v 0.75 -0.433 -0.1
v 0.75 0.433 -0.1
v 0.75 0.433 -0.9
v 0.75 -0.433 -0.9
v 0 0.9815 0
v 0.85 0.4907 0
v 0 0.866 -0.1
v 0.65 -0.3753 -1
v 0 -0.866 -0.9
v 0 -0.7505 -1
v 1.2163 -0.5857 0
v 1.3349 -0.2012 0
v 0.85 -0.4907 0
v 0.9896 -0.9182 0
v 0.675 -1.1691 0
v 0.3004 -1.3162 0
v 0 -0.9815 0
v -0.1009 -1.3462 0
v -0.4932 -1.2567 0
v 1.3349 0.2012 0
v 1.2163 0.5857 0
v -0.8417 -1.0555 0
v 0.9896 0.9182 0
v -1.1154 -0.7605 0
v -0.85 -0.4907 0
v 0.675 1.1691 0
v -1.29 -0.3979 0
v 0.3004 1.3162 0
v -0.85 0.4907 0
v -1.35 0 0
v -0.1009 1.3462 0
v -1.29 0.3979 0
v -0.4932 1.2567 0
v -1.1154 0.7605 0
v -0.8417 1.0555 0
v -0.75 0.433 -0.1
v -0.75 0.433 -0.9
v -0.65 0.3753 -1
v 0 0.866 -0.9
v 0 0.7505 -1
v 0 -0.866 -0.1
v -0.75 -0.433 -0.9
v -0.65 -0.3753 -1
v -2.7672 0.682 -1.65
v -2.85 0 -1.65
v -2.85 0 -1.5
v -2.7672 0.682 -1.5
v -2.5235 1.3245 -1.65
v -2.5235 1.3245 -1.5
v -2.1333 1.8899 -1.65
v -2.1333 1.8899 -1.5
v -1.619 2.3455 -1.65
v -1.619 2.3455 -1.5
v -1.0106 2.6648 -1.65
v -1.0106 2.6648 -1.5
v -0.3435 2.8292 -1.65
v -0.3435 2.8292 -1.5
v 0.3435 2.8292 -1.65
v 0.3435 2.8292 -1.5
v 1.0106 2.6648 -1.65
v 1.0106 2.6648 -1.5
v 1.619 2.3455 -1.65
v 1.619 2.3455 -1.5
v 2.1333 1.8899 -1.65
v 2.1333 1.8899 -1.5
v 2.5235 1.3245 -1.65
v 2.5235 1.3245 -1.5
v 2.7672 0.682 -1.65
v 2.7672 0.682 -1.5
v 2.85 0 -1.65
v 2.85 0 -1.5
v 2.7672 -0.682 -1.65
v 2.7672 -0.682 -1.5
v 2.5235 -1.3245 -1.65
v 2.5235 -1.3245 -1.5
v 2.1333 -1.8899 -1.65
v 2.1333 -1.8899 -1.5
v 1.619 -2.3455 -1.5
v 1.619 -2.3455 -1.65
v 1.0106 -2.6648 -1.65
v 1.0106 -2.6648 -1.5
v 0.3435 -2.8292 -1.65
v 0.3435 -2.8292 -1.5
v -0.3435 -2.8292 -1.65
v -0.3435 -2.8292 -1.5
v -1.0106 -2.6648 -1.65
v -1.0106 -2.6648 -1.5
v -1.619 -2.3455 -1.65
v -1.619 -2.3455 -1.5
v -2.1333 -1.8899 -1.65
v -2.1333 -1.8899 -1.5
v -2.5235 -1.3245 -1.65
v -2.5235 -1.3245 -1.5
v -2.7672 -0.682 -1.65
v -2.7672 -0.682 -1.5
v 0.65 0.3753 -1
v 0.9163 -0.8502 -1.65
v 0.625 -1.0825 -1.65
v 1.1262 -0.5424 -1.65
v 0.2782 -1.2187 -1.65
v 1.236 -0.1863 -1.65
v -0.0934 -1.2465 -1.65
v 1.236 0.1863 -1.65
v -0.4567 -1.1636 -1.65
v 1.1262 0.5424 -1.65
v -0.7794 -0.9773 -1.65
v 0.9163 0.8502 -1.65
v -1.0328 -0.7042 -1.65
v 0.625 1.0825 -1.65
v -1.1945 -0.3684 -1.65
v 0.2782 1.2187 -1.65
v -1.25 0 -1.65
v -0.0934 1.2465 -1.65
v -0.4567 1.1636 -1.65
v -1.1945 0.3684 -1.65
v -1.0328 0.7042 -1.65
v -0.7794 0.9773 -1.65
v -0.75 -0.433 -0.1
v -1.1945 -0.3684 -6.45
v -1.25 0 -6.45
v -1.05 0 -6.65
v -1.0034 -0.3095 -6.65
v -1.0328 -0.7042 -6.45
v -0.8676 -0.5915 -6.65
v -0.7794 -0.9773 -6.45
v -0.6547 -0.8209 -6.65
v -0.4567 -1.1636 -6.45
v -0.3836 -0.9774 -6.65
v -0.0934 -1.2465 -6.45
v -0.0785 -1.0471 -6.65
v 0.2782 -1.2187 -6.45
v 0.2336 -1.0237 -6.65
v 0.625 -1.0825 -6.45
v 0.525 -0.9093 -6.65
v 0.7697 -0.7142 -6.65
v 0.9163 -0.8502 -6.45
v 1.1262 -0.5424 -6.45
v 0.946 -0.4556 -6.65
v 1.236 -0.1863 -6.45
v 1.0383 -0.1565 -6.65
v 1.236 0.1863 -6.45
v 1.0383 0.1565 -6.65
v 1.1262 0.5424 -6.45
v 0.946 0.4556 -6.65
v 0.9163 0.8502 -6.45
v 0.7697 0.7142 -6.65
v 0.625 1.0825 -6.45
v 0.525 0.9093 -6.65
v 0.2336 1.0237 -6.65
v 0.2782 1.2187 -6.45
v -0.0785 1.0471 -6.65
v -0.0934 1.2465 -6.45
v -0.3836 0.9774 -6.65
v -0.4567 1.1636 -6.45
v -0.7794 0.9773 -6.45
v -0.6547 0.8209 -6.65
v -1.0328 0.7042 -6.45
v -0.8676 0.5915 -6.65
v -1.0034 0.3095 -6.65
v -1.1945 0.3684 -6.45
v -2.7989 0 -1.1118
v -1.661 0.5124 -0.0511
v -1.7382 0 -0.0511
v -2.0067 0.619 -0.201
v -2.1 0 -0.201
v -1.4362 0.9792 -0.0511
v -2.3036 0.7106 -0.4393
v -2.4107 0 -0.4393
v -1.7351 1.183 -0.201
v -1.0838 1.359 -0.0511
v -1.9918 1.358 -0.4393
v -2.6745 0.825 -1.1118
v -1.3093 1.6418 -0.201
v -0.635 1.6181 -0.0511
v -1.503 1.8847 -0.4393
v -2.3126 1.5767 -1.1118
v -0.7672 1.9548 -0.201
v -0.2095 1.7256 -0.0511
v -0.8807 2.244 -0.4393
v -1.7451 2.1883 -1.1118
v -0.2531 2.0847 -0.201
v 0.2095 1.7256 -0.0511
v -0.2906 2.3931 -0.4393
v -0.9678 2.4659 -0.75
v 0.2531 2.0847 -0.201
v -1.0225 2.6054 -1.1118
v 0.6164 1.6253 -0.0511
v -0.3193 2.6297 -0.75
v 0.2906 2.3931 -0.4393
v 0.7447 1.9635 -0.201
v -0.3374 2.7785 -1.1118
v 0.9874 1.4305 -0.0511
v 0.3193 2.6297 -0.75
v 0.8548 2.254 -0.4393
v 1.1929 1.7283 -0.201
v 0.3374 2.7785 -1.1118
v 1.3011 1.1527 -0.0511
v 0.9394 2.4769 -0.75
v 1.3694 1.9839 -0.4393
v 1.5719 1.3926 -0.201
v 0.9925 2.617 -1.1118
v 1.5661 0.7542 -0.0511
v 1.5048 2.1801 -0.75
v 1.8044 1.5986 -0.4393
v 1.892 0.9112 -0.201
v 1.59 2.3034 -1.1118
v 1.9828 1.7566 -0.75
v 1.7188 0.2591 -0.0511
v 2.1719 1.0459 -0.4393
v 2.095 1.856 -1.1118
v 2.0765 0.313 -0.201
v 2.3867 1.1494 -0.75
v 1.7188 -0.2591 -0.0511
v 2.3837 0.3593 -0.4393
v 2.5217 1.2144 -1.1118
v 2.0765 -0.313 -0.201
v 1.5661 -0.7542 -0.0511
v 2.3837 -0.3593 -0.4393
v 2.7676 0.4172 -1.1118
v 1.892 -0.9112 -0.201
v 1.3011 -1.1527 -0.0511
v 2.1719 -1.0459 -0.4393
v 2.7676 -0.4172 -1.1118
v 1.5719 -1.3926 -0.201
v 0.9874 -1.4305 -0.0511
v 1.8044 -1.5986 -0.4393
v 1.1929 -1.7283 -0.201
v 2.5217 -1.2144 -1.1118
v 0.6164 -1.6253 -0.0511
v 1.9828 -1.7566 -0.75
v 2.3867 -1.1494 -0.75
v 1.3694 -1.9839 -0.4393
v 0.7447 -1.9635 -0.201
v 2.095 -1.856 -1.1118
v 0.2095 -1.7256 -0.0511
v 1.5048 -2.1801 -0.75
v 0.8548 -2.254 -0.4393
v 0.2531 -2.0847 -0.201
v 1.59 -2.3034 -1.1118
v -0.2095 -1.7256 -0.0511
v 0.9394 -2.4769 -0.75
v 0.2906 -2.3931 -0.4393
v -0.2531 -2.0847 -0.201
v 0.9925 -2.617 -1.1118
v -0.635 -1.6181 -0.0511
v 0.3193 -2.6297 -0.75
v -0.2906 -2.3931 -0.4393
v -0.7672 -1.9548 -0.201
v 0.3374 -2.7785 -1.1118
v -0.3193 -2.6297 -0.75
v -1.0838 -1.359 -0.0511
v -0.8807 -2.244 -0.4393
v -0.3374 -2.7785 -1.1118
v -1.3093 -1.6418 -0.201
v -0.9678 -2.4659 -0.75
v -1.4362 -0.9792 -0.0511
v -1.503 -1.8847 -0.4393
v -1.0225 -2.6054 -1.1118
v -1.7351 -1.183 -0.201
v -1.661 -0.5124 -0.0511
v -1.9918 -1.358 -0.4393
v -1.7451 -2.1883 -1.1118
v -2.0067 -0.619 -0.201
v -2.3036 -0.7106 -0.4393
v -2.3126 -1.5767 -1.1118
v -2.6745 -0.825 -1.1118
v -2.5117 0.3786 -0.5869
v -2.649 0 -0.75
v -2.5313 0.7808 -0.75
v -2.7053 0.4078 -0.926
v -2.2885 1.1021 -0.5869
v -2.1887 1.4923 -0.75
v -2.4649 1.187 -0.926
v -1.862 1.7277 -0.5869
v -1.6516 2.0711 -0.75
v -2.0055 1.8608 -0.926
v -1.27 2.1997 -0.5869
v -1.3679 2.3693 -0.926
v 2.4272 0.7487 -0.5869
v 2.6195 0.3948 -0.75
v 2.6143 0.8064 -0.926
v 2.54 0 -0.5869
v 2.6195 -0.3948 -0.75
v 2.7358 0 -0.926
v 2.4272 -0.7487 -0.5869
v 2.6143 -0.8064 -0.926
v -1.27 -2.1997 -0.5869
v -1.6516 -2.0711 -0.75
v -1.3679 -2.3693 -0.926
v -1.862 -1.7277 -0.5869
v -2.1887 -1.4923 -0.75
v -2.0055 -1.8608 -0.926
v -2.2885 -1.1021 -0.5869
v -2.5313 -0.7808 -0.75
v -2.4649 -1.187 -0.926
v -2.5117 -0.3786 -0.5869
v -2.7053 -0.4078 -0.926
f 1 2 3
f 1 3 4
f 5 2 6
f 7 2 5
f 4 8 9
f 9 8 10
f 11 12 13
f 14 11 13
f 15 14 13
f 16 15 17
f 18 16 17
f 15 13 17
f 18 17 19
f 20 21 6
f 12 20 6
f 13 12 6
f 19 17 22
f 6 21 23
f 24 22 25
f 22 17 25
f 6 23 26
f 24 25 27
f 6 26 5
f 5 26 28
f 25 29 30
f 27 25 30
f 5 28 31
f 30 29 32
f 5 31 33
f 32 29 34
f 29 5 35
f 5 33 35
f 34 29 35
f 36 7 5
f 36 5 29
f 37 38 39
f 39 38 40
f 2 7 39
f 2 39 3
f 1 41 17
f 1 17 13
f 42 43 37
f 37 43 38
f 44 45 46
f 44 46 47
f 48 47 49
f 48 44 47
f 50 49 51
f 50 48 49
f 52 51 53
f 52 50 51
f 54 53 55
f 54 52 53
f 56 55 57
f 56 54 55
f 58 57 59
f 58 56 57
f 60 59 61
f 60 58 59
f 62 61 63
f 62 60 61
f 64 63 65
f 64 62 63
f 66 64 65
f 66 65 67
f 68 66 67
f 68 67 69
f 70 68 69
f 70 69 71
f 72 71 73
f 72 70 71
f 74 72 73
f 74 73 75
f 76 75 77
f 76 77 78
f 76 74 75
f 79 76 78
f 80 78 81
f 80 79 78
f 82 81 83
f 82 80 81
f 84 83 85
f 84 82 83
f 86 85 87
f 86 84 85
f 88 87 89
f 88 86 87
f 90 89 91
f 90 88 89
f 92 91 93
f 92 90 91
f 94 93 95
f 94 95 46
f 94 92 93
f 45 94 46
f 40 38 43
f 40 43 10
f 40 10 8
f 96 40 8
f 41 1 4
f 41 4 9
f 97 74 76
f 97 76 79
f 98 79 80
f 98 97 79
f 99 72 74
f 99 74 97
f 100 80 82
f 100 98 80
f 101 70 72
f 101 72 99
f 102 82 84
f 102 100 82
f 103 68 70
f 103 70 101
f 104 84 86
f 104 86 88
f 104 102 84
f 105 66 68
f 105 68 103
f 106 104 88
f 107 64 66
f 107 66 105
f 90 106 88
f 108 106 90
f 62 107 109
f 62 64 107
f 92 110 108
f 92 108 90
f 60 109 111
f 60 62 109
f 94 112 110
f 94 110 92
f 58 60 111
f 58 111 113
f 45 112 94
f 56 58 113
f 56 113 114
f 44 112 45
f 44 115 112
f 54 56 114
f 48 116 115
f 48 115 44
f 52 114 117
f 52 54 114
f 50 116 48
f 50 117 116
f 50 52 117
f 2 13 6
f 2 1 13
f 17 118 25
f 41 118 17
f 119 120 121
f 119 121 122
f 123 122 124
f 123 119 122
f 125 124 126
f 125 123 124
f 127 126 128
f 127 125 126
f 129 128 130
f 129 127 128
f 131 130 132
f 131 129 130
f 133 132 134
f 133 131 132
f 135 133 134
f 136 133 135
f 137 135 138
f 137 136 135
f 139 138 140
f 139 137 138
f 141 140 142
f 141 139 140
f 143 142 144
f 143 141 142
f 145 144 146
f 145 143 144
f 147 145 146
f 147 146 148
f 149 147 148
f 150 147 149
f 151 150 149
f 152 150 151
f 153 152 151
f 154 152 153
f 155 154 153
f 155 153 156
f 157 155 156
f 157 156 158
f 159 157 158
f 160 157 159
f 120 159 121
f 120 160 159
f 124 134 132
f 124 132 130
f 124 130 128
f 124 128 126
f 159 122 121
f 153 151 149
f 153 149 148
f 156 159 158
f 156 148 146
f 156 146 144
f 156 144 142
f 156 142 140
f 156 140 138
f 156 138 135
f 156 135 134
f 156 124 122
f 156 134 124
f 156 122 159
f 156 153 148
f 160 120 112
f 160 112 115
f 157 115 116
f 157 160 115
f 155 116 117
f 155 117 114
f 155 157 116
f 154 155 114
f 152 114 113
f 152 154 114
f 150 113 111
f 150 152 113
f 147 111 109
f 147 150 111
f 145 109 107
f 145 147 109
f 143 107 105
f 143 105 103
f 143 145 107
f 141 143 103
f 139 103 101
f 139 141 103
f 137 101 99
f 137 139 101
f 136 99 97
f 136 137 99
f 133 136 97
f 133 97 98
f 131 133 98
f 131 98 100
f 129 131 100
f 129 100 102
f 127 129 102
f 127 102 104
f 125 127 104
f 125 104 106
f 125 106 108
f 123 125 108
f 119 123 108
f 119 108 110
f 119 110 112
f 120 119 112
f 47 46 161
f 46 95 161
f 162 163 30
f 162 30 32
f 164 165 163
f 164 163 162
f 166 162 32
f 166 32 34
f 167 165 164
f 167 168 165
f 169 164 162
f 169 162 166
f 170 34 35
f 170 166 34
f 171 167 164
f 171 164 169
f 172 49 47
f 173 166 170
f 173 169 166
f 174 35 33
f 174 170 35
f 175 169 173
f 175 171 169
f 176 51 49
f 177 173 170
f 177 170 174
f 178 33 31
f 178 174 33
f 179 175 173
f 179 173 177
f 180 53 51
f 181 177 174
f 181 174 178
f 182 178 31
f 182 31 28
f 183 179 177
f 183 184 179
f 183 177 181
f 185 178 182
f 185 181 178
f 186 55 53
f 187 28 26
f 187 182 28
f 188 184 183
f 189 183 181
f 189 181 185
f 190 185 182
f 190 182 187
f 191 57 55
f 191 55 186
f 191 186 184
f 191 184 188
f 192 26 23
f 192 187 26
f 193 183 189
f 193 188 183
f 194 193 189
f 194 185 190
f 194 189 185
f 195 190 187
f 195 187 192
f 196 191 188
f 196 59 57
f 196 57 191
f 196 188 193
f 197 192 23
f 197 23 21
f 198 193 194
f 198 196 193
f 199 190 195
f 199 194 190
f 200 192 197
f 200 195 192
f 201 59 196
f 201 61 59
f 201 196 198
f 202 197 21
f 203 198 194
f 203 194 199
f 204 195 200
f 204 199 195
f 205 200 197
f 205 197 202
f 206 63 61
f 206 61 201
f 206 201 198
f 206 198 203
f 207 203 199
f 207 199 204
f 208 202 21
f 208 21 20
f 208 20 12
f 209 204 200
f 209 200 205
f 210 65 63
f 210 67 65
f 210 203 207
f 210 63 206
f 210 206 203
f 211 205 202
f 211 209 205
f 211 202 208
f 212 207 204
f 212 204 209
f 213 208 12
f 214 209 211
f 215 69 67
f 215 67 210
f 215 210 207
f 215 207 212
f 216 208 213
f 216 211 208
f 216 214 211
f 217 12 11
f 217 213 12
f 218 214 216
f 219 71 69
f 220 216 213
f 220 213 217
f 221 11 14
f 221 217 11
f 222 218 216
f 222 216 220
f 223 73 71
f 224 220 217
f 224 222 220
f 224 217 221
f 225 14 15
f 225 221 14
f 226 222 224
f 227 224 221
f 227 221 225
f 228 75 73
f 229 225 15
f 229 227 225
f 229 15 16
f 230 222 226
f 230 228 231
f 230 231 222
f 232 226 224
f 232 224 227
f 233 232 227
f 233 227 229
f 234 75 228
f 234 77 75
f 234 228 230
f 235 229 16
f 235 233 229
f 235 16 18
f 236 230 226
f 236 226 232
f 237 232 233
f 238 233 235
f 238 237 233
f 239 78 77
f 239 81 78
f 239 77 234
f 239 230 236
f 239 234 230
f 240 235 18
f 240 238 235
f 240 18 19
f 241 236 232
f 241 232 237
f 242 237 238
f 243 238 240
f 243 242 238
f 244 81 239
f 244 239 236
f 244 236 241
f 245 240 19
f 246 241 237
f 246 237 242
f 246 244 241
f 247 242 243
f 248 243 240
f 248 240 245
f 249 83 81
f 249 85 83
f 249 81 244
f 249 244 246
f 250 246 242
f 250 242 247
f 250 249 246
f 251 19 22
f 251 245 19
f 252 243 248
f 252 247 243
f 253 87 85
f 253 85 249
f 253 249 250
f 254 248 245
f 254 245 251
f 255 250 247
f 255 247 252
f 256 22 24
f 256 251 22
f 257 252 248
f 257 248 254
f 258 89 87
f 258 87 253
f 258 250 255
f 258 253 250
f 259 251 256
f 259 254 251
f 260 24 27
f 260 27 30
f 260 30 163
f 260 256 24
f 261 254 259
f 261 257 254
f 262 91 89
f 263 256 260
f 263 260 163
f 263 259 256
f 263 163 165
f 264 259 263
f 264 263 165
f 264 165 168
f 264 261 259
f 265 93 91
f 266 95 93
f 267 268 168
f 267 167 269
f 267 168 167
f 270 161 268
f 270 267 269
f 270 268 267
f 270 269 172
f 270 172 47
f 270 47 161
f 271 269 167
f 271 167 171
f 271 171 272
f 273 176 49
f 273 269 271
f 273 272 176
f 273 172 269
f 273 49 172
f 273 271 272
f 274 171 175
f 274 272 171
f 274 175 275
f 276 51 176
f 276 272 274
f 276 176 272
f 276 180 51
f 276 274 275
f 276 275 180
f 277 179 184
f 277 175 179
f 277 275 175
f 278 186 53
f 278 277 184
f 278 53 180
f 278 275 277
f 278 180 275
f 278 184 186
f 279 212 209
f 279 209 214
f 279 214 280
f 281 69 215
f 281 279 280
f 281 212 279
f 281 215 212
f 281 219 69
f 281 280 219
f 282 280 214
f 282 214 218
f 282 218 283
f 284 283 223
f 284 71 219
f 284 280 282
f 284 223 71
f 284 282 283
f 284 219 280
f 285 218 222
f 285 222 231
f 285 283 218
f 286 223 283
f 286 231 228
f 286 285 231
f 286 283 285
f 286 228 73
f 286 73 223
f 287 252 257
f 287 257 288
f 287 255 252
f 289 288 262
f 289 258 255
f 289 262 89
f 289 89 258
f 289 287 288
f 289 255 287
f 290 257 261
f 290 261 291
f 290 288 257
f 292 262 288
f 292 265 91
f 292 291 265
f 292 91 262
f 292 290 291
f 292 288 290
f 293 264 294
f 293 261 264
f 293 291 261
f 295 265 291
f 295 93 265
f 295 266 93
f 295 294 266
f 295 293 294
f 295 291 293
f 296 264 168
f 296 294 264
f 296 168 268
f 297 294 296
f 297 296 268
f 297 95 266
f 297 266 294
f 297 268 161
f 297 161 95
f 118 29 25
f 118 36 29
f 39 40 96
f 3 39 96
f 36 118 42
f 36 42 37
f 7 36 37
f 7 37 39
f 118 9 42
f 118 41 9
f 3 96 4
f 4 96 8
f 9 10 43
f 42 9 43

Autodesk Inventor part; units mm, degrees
ref_plane "YZ Plane" through (0, 0, 0) normal (1, 0, 0) x (0, 1, 0)
ref_plane "XZ Plane" through (0, 0, 0) normal (0, 1, 0) x (-1, 0, 0)
ref_plane "XY Plane" through (0, 0, 0) normal (0, 0, 1) x (1, 0, 0)
sketch "Sketch2" plane through (0, 0, 0) normal (0, 1, 0) x (-1, 0, 0)
  line L0 (0, 0) -> (2.85, 0)
  line L1 (2.85, 0) -> (2.85, -1.65)
  line L2 (2.85, -1.65) -> (1.25, -1.65)
  line L3 (1.25, -1.65) -> (1.25, -6.65)
  line L4 (1.25, -6.65) -> (0, -6.65)
  line L5 (0, 0) -> (0, -6.65)
  dimension "d9" = 2.85
  dimension "d10" = 1.65
  dimension "d12" = 5
  dimension "d19" = 2.5
revolve "Revolution1" add sketch "Sketch2" angle 360 about axis through (0, 0, 0) along (0, 0, -1)
fillet "Fillet1" radius 1.5 1 edges at (2.85, 0, 0)
chamfer "Chamfer1" distance 0.2 angle 45 1 edges at (1.25, 0, -6.65)
thread "Thread1" size "M2.5x0.45" class "6g" standard "ANSI Metric M Profile" full length
sketch "Sketch4" plane through (0, 0, 0) normal (0, 0, 1) x (1, 0, 0)
  line L0 (0, 0.866) -> (0.75, 0.433)
  line L1 (0.75, 0.433) -> (0.75, -0.433)
  line L2 (0.75, -0.433) -> (0, -0.866)
  line L3 (0, -0.866) -> (-0.75, -0.433)
  line L4 (-0.75, -0.433) -> (-0.75, 0.433)
  line L5 (-0.75, 0.433) -> (0, 0.866)
  circle A0 centre (0, 0) radius 1.05 projected
  point P0 (0, 0)
  dimension "d22" = 1.5
  dimension "d30" = 0.433
extrude "Extrusion2" cut sketch "Sketch4" against normal blind 1 contours L0 L1 L2 L3 L4 L5
chamfer "Chamfer2" distance 0.1 angle 45 12 edges at (-0.75, 0, 0) (-0.375, 0.6495, 0) (0.375, 0.6495, 0) (0.75, 0, 0) (0.375, -0.6495, 0) (-0.375, -0.6495, 0) (-0.375, 0.6495, -1) (-0.75, 0, -1) (-0.375, -0.6495, -1) (0.375, -0.6495, -1) (0.75, 0, -1) (0.375, 0.6495, -1)
properties part number "rapoukHexagonScrewM2,5v0" material "Steel, Carbon"
